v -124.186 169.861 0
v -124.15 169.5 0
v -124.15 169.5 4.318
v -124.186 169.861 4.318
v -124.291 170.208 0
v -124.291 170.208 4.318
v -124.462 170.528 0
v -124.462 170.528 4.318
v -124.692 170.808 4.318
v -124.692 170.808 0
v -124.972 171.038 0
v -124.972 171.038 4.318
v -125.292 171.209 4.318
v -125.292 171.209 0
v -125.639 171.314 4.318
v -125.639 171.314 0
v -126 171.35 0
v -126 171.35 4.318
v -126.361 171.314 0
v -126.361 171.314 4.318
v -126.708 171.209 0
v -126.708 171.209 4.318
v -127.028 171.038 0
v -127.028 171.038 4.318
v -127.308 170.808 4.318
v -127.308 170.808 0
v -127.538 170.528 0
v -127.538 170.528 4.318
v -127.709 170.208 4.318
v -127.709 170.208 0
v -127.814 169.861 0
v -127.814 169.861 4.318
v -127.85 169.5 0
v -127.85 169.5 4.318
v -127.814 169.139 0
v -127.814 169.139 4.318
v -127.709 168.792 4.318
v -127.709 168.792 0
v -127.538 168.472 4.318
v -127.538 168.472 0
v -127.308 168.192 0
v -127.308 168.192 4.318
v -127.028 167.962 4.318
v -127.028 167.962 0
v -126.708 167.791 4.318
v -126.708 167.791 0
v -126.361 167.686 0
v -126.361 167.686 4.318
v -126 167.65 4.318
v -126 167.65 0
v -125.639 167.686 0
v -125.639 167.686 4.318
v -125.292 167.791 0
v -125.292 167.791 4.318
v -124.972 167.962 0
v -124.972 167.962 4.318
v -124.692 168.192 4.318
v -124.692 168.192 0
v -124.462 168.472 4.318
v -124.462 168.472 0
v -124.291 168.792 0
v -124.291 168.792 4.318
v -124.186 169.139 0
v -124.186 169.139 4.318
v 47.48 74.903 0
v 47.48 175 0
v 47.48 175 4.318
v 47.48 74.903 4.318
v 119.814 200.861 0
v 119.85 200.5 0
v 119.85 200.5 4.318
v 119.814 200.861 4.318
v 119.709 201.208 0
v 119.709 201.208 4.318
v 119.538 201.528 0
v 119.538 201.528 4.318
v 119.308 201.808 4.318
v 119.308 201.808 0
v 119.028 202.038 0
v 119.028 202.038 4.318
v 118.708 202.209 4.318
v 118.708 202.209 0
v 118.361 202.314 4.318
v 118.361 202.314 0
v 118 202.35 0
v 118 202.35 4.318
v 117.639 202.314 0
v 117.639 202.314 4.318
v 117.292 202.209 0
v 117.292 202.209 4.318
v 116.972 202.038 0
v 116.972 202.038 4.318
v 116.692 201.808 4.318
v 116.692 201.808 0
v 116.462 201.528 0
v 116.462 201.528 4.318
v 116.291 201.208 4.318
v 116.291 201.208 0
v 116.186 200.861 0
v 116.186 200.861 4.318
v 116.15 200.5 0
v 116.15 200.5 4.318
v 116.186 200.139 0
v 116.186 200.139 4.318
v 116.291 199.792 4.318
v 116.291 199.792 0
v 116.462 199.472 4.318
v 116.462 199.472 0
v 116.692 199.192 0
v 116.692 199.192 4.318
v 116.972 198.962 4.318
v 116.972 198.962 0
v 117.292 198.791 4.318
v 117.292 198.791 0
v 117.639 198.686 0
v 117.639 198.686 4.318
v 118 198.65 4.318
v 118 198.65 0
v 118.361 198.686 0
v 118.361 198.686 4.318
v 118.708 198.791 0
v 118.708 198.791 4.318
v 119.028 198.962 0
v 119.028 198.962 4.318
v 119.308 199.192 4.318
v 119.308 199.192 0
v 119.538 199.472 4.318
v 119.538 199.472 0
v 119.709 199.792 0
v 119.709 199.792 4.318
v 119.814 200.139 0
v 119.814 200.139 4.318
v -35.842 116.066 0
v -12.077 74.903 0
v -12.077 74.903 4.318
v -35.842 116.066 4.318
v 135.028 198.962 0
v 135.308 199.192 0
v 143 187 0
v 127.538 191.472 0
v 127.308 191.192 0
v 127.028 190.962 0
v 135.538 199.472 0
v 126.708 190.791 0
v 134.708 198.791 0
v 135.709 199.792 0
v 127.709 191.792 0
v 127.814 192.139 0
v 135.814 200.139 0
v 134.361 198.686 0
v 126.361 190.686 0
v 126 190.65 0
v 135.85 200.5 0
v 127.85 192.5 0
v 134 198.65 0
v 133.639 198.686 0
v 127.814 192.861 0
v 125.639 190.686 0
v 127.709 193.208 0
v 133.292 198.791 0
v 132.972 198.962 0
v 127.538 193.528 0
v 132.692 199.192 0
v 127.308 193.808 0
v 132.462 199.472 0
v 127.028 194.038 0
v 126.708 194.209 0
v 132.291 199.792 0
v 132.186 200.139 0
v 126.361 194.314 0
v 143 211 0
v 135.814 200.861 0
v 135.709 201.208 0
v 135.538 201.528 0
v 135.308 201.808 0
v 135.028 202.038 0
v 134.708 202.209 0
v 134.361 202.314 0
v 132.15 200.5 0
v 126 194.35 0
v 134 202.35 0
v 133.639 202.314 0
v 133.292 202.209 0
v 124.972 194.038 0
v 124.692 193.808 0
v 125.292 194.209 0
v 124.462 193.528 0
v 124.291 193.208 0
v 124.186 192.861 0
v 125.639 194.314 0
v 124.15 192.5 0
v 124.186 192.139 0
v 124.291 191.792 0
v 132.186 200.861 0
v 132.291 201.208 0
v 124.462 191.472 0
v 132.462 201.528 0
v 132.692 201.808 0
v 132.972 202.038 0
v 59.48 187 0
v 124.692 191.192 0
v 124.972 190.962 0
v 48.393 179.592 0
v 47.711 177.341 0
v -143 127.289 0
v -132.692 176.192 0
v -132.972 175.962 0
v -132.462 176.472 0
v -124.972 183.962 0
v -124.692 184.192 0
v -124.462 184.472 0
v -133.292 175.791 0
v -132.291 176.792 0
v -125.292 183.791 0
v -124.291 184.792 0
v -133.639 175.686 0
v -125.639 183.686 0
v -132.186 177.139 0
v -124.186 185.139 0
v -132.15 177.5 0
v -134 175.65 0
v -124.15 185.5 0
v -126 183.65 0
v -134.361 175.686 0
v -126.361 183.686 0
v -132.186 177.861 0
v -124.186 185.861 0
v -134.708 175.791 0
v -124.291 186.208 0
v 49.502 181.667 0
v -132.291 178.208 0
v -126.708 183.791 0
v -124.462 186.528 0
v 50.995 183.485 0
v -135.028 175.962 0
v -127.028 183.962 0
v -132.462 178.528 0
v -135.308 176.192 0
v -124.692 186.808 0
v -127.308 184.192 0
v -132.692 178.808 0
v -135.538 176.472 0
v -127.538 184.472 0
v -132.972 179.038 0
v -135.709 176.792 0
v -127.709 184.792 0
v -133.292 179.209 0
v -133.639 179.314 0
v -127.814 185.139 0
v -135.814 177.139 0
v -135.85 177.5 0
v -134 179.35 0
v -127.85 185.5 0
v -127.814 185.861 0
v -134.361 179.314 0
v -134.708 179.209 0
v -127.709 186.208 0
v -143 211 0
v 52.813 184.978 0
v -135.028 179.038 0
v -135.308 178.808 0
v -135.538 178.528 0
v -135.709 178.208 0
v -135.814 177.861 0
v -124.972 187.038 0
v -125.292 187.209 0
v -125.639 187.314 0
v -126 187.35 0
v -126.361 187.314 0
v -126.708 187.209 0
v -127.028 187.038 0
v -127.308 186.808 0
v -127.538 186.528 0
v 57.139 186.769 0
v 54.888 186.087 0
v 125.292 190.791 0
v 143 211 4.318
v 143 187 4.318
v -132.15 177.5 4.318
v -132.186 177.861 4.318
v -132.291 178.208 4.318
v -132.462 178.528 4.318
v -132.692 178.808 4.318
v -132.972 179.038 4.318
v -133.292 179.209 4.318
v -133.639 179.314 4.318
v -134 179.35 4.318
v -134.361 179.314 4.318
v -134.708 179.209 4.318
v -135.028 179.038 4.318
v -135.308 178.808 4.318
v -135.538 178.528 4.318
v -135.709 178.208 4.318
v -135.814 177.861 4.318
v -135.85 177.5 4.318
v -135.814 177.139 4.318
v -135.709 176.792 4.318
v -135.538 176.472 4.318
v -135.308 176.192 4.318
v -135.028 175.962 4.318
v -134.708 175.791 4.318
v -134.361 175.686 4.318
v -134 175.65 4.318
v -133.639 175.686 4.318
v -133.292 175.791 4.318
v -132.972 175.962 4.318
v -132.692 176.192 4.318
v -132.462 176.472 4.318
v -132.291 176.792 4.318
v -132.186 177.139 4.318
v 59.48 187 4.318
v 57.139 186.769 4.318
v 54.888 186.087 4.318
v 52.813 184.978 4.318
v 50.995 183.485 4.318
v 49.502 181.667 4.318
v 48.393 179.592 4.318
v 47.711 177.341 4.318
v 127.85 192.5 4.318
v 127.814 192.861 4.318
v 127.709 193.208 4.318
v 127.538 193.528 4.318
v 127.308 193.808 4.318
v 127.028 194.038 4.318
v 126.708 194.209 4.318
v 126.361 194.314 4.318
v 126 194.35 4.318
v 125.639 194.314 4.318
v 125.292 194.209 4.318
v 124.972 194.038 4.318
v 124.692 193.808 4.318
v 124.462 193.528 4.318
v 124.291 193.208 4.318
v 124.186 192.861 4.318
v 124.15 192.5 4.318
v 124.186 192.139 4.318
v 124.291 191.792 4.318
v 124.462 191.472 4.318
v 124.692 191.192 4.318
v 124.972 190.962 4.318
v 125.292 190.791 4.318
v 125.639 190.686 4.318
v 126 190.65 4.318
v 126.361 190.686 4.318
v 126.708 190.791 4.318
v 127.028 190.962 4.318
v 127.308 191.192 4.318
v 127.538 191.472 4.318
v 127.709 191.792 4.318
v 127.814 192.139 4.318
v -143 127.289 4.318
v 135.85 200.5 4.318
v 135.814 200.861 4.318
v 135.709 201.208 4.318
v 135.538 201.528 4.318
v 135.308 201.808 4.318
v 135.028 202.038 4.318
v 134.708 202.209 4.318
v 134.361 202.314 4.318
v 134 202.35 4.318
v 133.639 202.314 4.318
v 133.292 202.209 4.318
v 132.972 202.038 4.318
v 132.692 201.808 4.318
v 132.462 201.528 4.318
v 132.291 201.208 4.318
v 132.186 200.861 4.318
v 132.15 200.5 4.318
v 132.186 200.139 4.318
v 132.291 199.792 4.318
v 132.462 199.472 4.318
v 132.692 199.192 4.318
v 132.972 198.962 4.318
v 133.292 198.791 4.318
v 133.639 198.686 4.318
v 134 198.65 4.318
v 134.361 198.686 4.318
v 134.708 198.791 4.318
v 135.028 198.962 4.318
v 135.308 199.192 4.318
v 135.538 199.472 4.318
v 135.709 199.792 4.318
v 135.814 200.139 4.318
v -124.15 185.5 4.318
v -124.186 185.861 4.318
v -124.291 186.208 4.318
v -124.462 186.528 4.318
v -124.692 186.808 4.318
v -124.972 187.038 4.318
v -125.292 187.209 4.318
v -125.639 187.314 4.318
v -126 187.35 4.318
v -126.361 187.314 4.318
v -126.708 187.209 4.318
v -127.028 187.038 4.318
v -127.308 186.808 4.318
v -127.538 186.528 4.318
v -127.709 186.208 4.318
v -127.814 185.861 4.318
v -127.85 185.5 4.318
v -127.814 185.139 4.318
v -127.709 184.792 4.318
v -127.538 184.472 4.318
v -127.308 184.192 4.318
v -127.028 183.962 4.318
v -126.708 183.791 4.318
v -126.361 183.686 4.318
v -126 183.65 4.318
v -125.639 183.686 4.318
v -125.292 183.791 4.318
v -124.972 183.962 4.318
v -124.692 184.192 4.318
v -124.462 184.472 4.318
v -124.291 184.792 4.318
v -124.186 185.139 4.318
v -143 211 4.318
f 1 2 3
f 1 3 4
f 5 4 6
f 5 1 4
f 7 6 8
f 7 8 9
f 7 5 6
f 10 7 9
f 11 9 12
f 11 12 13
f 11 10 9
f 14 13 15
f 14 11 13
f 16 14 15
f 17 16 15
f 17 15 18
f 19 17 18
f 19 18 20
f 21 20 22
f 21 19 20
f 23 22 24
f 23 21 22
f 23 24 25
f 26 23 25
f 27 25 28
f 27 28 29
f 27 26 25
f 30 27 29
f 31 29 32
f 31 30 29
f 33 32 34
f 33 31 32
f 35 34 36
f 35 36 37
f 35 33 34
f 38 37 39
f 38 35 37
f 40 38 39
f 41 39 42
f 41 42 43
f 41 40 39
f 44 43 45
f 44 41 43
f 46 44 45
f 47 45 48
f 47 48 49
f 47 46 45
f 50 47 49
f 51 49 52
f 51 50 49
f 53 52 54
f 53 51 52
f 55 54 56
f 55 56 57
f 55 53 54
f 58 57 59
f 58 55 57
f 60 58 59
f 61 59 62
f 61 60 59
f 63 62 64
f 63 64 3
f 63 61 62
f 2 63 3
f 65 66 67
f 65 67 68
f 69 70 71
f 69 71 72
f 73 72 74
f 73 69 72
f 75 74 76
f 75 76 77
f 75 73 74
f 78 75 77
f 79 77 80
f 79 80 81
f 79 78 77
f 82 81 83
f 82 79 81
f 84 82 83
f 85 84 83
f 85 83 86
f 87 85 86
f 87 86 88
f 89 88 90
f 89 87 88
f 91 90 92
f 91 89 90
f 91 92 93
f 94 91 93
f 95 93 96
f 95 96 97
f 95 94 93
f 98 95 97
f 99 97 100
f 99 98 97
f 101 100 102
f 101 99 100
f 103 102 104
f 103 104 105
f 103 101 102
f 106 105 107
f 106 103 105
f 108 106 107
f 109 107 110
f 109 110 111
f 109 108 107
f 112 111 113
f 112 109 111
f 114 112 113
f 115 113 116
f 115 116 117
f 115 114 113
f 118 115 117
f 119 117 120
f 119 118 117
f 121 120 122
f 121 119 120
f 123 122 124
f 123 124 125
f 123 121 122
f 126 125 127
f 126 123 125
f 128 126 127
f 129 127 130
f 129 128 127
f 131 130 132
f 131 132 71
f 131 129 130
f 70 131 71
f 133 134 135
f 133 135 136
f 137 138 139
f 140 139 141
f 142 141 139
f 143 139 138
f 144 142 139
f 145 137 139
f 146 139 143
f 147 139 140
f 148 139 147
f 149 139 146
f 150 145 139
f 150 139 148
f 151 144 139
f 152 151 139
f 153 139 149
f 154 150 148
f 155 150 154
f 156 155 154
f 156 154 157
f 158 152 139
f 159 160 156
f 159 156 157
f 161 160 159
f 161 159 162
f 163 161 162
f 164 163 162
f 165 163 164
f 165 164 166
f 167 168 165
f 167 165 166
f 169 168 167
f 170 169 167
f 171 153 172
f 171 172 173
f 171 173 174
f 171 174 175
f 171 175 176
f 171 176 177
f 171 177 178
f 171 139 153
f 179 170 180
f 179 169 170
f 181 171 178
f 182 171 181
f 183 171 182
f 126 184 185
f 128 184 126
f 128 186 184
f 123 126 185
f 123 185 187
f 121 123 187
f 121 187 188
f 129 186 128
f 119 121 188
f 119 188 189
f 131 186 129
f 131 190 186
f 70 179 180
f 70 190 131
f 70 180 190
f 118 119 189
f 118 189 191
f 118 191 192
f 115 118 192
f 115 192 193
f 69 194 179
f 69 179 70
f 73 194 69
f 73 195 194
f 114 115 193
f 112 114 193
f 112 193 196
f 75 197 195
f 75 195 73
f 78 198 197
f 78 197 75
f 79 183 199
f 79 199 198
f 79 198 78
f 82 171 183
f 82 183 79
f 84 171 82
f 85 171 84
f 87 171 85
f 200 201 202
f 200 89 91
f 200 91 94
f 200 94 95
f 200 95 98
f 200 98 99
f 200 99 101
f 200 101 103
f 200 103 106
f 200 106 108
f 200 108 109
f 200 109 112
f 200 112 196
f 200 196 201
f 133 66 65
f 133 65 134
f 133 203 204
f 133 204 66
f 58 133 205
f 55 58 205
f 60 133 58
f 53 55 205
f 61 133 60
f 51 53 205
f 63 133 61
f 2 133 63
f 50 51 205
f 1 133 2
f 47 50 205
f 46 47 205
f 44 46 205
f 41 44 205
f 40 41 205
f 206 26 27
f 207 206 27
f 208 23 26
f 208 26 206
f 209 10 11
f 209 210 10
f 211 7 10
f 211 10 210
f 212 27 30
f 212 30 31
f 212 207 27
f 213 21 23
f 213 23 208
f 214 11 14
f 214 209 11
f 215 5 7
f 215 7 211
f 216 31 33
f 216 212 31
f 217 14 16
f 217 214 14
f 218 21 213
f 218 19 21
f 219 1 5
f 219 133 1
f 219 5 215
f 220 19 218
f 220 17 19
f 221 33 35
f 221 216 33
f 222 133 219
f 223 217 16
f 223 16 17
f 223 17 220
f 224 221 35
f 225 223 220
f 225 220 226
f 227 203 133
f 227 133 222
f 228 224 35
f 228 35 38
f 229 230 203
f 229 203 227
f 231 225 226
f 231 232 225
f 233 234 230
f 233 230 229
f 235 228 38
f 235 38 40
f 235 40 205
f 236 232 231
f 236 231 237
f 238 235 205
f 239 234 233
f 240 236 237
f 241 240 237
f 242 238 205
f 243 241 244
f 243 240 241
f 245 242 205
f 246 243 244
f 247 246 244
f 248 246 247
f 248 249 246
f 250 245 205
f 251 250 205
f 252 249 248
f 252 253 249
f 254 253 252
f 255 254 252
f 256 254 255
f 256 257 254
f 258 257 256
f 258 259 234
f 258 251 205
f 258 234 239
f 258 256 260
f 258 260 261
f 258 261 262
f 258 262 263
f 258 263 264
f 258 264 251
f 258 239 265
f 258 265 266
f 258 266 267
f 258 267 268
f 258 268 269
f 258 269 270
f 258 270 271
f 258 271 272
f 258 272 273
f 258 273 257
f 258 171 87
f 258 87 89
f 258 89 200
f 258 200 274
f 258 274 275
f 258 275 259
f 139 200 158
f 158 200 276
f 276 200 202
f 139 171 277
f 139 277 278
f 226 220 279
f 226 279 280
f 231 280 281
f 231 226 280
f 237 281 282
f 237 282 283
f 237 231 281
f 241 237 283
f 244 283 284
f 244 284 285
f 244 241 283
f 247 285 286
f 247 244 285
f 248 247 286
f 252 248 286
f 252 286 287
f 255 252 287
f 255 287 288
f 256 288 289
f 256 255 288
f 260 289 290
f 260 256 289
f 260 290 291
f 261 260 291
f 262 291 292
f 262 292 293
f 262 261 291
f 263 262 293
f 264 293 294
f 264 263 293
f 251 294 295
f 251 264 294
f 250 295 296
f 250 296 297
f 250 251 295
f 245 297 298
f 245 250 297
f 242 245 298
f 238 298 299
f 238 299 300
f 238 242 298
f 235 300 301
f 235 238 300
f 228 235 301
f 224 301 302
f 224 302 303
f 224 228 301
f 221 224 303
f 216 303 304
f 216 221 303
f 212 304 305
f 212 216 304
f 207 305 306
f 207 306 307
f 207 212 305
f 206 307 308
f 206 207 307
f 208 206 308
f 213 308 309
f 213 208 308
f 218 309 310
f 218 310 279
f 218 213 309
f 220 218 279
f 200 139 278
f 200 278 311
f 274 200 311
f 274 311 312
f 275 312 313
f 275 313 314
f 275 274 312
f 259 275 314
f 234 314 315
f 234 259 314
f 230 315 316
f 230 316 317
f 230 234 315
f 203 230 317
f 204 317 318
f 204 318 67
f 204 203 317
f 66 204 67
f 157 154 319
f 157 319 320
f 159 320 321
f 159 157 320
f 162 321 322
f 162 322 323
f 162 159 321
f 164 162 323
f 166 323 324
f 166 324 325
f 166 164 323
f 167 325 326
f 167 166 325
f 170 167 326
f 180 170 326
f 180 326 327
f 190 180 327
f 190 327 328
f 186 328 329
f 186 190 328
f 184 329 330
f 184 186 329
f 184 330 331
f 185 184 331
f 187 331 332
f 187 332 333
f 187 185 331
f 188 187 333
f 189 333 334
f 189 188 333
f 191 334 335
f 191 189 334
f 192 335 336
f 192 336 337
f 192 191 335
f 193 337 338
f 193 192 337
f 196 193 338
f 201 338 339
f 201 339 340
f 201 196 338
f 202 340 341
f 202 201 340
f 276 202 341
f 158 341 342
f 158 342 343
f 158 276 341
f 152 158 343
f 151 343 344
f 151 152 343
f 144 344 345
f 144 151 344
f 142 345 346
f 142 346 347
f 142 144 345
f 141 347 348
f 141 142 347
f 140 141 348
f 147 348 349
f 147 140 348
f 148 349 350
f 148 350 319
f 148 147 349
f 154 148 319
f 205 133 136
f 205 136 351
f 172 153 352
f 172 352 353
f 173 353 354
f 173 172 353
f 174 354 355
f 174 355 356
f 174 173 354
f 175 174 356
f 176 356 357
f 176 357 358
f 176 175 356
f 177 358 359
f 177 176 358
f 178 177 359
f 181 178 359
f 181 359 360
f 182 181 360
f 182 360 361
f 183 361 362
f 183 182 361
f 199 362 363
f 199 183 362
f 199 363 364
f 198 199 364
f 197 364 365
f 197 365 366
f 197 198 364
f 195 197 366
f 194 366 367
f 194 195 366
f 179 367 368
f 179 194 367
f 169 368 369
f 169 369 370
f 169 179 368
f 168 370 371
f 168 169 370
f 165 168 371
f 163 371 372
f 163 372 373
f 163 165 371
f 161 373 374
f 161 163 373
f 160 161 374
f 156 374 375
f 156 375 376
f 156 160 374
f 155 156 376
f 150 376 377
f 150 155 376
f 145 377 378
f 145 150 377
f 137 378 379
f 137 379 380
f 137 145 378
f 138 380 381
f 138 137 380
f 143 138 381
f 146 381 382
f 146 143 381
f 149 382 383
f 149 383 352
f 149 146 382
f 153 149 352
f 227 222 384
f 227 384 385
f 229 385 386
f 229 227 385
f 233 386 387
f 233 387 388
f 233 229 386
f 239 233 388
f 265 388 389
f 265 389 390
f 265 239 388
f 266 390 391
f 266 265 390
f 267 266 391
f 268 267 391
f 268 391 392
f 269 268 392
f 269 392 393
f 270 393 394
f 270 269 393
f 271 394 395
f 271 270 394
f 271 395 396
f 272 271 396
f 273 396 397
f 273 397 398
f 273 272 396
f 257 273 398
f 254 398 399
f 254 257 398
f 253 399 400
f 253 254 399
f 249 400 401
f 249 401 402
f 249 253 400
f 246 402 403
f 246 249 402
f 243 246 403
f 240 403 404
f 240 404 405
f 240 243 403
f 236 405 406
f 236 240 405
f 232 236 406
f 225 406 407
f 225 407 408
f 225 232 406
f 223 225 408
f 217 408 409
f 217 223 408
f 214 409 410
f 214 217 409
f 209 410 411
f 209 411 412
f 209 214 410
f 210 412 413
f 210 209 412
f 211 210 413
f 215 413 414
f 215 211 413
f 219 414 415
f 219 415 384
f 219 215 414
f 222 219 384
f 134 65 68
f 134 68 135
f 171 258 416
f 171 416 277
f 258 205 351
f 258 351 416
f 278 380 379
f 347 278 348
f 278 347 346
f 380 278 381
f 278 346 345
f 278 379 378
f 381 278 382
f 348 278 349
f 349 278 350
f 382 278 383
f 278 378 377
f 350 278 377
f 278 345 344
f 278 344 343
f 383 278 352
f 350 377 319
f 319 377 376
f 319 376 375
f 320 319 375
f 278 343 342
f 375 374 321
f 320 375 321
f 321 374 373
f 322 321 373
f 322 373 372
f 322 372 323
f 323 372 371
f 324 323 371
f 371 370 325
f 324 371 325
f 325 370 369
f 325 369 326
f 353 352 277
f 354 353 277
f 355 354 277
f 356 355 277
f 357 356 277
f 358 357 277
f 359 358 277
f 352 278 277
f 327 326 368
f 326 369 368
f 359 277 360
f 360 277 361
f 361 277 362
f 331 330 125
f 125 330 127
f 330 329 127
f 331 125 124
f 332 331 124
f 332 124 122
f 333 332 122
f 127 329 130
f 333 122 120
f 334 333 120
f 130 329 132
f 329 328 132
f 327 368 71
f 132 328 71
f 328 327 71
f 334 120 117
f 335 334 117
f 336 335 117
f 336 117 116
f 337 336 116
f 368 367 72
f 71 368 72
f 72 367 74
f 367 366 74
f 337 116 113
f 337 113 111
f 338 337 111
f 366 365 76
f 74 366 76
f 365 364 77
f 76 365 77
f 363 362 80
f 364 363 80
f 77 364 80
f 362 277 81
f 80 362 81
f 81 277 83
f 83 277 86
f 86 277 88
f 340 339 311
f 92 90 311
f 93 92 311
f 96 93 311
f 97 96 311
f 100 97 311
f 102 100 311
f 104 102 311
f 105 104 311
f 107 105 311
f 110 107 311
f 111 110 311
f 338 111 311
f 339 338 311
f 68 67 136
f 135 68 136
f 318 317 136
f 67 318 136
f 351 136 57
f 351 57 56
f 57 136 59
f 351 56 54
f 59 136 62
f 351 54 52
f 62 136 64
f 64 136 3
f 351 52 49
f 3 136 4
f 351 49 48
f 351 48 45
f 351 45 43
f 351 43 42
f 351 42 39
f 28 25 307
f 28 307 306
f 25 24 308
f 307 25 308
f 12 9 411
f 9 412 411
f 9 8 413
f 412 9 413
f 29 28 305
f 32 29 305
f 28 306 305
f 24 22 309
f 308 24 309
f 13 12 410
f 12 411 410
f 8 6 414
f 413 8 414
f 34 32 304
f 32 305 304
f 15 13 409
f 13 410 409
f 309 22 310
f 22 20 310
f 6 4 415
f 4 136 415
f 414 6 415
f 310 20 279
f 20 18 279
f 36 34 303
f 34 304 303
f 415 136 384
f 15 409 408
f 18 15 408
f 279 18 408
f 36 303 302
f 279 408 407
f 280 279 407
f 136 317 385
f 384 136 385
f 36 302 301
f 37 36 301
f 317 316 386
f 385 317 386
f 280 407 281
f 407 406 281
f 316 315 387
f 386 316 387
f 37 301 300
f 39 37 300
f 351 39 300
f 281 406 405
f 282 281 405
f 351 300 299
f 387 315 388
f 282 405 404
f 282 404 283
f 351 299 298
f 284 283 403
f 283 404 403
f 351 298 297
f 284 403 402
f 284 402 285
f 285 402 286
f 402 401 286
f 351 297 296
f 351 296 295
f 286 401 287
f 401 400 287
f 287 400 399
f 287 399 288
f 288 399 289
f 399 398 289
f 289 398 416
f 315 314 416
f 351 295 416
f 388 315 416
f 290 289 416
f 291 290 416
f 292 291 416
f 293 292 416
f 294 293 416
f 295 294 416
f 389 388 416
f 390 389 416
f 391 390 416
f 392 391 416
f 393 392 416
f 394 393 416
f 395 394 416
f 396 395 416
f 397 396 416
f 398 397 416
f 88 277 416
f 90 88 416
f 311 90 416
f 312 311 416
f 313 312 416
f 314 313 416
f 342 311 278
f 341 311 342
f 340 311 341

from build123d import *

# Parameters (mm, degrees)
SKETCH1_R           = 1.85
BOSS_EXTRUDE1_DEPTH = 4.318


with BuildPart() as part:
    # Sketch1 → Boss-Extrude1 (new body)
    with BuildSketch(Plane.XY):
        with BuildLine():
            Line((47.48, 175), (47.48, 74.903475932))
            Line((47.48, 74.903475932), (-12.077446035, 74.903475932))
            Line((-12.077446035, 74.903475932), (-35.842451234, 116.06567238))
            Line((-35.842451234, 116.06567238), (-143, 127.288973426))
            Line((-143, 127.288973426), (-143, 211))
            Line((-143, 211), (143, 211))
            Line((143, 211), (143, 187))
            Line((143, 187), (59.48, 187))
            ThreePointArc((59.48, 187), (50.994718626, 183.485281374), (47.48, 175))
        make_face()
        with Locations((-134, 177.5)):
            Circle(SKETCH1_R, mode=Mode.SUBTRACT)
        with Locations((-126, 169.5)):
            Circle(SKETCH1_R, mode=Mode.SUBTRACT)
        with Locations((-126, 185.5)):
            Circle(SKETCH1_R, mode=Mode.SUBTRACT)
        with Locations((118, 200.5)):
            Circle(SKETCH1_R, mode=Mode.SUBTRACT)
        with Locations((126, 192.5)):
            Circle(SKETCH1_R, mode=Mode.SUBTRACT)
        with Locations((134, 200.5)):
            Circle(SKETCH1_R, mode=Mode.SUBTRACT)
    extrude(amount=BOSS_EXTRUDE1_DEPTH)


solid = part.part
